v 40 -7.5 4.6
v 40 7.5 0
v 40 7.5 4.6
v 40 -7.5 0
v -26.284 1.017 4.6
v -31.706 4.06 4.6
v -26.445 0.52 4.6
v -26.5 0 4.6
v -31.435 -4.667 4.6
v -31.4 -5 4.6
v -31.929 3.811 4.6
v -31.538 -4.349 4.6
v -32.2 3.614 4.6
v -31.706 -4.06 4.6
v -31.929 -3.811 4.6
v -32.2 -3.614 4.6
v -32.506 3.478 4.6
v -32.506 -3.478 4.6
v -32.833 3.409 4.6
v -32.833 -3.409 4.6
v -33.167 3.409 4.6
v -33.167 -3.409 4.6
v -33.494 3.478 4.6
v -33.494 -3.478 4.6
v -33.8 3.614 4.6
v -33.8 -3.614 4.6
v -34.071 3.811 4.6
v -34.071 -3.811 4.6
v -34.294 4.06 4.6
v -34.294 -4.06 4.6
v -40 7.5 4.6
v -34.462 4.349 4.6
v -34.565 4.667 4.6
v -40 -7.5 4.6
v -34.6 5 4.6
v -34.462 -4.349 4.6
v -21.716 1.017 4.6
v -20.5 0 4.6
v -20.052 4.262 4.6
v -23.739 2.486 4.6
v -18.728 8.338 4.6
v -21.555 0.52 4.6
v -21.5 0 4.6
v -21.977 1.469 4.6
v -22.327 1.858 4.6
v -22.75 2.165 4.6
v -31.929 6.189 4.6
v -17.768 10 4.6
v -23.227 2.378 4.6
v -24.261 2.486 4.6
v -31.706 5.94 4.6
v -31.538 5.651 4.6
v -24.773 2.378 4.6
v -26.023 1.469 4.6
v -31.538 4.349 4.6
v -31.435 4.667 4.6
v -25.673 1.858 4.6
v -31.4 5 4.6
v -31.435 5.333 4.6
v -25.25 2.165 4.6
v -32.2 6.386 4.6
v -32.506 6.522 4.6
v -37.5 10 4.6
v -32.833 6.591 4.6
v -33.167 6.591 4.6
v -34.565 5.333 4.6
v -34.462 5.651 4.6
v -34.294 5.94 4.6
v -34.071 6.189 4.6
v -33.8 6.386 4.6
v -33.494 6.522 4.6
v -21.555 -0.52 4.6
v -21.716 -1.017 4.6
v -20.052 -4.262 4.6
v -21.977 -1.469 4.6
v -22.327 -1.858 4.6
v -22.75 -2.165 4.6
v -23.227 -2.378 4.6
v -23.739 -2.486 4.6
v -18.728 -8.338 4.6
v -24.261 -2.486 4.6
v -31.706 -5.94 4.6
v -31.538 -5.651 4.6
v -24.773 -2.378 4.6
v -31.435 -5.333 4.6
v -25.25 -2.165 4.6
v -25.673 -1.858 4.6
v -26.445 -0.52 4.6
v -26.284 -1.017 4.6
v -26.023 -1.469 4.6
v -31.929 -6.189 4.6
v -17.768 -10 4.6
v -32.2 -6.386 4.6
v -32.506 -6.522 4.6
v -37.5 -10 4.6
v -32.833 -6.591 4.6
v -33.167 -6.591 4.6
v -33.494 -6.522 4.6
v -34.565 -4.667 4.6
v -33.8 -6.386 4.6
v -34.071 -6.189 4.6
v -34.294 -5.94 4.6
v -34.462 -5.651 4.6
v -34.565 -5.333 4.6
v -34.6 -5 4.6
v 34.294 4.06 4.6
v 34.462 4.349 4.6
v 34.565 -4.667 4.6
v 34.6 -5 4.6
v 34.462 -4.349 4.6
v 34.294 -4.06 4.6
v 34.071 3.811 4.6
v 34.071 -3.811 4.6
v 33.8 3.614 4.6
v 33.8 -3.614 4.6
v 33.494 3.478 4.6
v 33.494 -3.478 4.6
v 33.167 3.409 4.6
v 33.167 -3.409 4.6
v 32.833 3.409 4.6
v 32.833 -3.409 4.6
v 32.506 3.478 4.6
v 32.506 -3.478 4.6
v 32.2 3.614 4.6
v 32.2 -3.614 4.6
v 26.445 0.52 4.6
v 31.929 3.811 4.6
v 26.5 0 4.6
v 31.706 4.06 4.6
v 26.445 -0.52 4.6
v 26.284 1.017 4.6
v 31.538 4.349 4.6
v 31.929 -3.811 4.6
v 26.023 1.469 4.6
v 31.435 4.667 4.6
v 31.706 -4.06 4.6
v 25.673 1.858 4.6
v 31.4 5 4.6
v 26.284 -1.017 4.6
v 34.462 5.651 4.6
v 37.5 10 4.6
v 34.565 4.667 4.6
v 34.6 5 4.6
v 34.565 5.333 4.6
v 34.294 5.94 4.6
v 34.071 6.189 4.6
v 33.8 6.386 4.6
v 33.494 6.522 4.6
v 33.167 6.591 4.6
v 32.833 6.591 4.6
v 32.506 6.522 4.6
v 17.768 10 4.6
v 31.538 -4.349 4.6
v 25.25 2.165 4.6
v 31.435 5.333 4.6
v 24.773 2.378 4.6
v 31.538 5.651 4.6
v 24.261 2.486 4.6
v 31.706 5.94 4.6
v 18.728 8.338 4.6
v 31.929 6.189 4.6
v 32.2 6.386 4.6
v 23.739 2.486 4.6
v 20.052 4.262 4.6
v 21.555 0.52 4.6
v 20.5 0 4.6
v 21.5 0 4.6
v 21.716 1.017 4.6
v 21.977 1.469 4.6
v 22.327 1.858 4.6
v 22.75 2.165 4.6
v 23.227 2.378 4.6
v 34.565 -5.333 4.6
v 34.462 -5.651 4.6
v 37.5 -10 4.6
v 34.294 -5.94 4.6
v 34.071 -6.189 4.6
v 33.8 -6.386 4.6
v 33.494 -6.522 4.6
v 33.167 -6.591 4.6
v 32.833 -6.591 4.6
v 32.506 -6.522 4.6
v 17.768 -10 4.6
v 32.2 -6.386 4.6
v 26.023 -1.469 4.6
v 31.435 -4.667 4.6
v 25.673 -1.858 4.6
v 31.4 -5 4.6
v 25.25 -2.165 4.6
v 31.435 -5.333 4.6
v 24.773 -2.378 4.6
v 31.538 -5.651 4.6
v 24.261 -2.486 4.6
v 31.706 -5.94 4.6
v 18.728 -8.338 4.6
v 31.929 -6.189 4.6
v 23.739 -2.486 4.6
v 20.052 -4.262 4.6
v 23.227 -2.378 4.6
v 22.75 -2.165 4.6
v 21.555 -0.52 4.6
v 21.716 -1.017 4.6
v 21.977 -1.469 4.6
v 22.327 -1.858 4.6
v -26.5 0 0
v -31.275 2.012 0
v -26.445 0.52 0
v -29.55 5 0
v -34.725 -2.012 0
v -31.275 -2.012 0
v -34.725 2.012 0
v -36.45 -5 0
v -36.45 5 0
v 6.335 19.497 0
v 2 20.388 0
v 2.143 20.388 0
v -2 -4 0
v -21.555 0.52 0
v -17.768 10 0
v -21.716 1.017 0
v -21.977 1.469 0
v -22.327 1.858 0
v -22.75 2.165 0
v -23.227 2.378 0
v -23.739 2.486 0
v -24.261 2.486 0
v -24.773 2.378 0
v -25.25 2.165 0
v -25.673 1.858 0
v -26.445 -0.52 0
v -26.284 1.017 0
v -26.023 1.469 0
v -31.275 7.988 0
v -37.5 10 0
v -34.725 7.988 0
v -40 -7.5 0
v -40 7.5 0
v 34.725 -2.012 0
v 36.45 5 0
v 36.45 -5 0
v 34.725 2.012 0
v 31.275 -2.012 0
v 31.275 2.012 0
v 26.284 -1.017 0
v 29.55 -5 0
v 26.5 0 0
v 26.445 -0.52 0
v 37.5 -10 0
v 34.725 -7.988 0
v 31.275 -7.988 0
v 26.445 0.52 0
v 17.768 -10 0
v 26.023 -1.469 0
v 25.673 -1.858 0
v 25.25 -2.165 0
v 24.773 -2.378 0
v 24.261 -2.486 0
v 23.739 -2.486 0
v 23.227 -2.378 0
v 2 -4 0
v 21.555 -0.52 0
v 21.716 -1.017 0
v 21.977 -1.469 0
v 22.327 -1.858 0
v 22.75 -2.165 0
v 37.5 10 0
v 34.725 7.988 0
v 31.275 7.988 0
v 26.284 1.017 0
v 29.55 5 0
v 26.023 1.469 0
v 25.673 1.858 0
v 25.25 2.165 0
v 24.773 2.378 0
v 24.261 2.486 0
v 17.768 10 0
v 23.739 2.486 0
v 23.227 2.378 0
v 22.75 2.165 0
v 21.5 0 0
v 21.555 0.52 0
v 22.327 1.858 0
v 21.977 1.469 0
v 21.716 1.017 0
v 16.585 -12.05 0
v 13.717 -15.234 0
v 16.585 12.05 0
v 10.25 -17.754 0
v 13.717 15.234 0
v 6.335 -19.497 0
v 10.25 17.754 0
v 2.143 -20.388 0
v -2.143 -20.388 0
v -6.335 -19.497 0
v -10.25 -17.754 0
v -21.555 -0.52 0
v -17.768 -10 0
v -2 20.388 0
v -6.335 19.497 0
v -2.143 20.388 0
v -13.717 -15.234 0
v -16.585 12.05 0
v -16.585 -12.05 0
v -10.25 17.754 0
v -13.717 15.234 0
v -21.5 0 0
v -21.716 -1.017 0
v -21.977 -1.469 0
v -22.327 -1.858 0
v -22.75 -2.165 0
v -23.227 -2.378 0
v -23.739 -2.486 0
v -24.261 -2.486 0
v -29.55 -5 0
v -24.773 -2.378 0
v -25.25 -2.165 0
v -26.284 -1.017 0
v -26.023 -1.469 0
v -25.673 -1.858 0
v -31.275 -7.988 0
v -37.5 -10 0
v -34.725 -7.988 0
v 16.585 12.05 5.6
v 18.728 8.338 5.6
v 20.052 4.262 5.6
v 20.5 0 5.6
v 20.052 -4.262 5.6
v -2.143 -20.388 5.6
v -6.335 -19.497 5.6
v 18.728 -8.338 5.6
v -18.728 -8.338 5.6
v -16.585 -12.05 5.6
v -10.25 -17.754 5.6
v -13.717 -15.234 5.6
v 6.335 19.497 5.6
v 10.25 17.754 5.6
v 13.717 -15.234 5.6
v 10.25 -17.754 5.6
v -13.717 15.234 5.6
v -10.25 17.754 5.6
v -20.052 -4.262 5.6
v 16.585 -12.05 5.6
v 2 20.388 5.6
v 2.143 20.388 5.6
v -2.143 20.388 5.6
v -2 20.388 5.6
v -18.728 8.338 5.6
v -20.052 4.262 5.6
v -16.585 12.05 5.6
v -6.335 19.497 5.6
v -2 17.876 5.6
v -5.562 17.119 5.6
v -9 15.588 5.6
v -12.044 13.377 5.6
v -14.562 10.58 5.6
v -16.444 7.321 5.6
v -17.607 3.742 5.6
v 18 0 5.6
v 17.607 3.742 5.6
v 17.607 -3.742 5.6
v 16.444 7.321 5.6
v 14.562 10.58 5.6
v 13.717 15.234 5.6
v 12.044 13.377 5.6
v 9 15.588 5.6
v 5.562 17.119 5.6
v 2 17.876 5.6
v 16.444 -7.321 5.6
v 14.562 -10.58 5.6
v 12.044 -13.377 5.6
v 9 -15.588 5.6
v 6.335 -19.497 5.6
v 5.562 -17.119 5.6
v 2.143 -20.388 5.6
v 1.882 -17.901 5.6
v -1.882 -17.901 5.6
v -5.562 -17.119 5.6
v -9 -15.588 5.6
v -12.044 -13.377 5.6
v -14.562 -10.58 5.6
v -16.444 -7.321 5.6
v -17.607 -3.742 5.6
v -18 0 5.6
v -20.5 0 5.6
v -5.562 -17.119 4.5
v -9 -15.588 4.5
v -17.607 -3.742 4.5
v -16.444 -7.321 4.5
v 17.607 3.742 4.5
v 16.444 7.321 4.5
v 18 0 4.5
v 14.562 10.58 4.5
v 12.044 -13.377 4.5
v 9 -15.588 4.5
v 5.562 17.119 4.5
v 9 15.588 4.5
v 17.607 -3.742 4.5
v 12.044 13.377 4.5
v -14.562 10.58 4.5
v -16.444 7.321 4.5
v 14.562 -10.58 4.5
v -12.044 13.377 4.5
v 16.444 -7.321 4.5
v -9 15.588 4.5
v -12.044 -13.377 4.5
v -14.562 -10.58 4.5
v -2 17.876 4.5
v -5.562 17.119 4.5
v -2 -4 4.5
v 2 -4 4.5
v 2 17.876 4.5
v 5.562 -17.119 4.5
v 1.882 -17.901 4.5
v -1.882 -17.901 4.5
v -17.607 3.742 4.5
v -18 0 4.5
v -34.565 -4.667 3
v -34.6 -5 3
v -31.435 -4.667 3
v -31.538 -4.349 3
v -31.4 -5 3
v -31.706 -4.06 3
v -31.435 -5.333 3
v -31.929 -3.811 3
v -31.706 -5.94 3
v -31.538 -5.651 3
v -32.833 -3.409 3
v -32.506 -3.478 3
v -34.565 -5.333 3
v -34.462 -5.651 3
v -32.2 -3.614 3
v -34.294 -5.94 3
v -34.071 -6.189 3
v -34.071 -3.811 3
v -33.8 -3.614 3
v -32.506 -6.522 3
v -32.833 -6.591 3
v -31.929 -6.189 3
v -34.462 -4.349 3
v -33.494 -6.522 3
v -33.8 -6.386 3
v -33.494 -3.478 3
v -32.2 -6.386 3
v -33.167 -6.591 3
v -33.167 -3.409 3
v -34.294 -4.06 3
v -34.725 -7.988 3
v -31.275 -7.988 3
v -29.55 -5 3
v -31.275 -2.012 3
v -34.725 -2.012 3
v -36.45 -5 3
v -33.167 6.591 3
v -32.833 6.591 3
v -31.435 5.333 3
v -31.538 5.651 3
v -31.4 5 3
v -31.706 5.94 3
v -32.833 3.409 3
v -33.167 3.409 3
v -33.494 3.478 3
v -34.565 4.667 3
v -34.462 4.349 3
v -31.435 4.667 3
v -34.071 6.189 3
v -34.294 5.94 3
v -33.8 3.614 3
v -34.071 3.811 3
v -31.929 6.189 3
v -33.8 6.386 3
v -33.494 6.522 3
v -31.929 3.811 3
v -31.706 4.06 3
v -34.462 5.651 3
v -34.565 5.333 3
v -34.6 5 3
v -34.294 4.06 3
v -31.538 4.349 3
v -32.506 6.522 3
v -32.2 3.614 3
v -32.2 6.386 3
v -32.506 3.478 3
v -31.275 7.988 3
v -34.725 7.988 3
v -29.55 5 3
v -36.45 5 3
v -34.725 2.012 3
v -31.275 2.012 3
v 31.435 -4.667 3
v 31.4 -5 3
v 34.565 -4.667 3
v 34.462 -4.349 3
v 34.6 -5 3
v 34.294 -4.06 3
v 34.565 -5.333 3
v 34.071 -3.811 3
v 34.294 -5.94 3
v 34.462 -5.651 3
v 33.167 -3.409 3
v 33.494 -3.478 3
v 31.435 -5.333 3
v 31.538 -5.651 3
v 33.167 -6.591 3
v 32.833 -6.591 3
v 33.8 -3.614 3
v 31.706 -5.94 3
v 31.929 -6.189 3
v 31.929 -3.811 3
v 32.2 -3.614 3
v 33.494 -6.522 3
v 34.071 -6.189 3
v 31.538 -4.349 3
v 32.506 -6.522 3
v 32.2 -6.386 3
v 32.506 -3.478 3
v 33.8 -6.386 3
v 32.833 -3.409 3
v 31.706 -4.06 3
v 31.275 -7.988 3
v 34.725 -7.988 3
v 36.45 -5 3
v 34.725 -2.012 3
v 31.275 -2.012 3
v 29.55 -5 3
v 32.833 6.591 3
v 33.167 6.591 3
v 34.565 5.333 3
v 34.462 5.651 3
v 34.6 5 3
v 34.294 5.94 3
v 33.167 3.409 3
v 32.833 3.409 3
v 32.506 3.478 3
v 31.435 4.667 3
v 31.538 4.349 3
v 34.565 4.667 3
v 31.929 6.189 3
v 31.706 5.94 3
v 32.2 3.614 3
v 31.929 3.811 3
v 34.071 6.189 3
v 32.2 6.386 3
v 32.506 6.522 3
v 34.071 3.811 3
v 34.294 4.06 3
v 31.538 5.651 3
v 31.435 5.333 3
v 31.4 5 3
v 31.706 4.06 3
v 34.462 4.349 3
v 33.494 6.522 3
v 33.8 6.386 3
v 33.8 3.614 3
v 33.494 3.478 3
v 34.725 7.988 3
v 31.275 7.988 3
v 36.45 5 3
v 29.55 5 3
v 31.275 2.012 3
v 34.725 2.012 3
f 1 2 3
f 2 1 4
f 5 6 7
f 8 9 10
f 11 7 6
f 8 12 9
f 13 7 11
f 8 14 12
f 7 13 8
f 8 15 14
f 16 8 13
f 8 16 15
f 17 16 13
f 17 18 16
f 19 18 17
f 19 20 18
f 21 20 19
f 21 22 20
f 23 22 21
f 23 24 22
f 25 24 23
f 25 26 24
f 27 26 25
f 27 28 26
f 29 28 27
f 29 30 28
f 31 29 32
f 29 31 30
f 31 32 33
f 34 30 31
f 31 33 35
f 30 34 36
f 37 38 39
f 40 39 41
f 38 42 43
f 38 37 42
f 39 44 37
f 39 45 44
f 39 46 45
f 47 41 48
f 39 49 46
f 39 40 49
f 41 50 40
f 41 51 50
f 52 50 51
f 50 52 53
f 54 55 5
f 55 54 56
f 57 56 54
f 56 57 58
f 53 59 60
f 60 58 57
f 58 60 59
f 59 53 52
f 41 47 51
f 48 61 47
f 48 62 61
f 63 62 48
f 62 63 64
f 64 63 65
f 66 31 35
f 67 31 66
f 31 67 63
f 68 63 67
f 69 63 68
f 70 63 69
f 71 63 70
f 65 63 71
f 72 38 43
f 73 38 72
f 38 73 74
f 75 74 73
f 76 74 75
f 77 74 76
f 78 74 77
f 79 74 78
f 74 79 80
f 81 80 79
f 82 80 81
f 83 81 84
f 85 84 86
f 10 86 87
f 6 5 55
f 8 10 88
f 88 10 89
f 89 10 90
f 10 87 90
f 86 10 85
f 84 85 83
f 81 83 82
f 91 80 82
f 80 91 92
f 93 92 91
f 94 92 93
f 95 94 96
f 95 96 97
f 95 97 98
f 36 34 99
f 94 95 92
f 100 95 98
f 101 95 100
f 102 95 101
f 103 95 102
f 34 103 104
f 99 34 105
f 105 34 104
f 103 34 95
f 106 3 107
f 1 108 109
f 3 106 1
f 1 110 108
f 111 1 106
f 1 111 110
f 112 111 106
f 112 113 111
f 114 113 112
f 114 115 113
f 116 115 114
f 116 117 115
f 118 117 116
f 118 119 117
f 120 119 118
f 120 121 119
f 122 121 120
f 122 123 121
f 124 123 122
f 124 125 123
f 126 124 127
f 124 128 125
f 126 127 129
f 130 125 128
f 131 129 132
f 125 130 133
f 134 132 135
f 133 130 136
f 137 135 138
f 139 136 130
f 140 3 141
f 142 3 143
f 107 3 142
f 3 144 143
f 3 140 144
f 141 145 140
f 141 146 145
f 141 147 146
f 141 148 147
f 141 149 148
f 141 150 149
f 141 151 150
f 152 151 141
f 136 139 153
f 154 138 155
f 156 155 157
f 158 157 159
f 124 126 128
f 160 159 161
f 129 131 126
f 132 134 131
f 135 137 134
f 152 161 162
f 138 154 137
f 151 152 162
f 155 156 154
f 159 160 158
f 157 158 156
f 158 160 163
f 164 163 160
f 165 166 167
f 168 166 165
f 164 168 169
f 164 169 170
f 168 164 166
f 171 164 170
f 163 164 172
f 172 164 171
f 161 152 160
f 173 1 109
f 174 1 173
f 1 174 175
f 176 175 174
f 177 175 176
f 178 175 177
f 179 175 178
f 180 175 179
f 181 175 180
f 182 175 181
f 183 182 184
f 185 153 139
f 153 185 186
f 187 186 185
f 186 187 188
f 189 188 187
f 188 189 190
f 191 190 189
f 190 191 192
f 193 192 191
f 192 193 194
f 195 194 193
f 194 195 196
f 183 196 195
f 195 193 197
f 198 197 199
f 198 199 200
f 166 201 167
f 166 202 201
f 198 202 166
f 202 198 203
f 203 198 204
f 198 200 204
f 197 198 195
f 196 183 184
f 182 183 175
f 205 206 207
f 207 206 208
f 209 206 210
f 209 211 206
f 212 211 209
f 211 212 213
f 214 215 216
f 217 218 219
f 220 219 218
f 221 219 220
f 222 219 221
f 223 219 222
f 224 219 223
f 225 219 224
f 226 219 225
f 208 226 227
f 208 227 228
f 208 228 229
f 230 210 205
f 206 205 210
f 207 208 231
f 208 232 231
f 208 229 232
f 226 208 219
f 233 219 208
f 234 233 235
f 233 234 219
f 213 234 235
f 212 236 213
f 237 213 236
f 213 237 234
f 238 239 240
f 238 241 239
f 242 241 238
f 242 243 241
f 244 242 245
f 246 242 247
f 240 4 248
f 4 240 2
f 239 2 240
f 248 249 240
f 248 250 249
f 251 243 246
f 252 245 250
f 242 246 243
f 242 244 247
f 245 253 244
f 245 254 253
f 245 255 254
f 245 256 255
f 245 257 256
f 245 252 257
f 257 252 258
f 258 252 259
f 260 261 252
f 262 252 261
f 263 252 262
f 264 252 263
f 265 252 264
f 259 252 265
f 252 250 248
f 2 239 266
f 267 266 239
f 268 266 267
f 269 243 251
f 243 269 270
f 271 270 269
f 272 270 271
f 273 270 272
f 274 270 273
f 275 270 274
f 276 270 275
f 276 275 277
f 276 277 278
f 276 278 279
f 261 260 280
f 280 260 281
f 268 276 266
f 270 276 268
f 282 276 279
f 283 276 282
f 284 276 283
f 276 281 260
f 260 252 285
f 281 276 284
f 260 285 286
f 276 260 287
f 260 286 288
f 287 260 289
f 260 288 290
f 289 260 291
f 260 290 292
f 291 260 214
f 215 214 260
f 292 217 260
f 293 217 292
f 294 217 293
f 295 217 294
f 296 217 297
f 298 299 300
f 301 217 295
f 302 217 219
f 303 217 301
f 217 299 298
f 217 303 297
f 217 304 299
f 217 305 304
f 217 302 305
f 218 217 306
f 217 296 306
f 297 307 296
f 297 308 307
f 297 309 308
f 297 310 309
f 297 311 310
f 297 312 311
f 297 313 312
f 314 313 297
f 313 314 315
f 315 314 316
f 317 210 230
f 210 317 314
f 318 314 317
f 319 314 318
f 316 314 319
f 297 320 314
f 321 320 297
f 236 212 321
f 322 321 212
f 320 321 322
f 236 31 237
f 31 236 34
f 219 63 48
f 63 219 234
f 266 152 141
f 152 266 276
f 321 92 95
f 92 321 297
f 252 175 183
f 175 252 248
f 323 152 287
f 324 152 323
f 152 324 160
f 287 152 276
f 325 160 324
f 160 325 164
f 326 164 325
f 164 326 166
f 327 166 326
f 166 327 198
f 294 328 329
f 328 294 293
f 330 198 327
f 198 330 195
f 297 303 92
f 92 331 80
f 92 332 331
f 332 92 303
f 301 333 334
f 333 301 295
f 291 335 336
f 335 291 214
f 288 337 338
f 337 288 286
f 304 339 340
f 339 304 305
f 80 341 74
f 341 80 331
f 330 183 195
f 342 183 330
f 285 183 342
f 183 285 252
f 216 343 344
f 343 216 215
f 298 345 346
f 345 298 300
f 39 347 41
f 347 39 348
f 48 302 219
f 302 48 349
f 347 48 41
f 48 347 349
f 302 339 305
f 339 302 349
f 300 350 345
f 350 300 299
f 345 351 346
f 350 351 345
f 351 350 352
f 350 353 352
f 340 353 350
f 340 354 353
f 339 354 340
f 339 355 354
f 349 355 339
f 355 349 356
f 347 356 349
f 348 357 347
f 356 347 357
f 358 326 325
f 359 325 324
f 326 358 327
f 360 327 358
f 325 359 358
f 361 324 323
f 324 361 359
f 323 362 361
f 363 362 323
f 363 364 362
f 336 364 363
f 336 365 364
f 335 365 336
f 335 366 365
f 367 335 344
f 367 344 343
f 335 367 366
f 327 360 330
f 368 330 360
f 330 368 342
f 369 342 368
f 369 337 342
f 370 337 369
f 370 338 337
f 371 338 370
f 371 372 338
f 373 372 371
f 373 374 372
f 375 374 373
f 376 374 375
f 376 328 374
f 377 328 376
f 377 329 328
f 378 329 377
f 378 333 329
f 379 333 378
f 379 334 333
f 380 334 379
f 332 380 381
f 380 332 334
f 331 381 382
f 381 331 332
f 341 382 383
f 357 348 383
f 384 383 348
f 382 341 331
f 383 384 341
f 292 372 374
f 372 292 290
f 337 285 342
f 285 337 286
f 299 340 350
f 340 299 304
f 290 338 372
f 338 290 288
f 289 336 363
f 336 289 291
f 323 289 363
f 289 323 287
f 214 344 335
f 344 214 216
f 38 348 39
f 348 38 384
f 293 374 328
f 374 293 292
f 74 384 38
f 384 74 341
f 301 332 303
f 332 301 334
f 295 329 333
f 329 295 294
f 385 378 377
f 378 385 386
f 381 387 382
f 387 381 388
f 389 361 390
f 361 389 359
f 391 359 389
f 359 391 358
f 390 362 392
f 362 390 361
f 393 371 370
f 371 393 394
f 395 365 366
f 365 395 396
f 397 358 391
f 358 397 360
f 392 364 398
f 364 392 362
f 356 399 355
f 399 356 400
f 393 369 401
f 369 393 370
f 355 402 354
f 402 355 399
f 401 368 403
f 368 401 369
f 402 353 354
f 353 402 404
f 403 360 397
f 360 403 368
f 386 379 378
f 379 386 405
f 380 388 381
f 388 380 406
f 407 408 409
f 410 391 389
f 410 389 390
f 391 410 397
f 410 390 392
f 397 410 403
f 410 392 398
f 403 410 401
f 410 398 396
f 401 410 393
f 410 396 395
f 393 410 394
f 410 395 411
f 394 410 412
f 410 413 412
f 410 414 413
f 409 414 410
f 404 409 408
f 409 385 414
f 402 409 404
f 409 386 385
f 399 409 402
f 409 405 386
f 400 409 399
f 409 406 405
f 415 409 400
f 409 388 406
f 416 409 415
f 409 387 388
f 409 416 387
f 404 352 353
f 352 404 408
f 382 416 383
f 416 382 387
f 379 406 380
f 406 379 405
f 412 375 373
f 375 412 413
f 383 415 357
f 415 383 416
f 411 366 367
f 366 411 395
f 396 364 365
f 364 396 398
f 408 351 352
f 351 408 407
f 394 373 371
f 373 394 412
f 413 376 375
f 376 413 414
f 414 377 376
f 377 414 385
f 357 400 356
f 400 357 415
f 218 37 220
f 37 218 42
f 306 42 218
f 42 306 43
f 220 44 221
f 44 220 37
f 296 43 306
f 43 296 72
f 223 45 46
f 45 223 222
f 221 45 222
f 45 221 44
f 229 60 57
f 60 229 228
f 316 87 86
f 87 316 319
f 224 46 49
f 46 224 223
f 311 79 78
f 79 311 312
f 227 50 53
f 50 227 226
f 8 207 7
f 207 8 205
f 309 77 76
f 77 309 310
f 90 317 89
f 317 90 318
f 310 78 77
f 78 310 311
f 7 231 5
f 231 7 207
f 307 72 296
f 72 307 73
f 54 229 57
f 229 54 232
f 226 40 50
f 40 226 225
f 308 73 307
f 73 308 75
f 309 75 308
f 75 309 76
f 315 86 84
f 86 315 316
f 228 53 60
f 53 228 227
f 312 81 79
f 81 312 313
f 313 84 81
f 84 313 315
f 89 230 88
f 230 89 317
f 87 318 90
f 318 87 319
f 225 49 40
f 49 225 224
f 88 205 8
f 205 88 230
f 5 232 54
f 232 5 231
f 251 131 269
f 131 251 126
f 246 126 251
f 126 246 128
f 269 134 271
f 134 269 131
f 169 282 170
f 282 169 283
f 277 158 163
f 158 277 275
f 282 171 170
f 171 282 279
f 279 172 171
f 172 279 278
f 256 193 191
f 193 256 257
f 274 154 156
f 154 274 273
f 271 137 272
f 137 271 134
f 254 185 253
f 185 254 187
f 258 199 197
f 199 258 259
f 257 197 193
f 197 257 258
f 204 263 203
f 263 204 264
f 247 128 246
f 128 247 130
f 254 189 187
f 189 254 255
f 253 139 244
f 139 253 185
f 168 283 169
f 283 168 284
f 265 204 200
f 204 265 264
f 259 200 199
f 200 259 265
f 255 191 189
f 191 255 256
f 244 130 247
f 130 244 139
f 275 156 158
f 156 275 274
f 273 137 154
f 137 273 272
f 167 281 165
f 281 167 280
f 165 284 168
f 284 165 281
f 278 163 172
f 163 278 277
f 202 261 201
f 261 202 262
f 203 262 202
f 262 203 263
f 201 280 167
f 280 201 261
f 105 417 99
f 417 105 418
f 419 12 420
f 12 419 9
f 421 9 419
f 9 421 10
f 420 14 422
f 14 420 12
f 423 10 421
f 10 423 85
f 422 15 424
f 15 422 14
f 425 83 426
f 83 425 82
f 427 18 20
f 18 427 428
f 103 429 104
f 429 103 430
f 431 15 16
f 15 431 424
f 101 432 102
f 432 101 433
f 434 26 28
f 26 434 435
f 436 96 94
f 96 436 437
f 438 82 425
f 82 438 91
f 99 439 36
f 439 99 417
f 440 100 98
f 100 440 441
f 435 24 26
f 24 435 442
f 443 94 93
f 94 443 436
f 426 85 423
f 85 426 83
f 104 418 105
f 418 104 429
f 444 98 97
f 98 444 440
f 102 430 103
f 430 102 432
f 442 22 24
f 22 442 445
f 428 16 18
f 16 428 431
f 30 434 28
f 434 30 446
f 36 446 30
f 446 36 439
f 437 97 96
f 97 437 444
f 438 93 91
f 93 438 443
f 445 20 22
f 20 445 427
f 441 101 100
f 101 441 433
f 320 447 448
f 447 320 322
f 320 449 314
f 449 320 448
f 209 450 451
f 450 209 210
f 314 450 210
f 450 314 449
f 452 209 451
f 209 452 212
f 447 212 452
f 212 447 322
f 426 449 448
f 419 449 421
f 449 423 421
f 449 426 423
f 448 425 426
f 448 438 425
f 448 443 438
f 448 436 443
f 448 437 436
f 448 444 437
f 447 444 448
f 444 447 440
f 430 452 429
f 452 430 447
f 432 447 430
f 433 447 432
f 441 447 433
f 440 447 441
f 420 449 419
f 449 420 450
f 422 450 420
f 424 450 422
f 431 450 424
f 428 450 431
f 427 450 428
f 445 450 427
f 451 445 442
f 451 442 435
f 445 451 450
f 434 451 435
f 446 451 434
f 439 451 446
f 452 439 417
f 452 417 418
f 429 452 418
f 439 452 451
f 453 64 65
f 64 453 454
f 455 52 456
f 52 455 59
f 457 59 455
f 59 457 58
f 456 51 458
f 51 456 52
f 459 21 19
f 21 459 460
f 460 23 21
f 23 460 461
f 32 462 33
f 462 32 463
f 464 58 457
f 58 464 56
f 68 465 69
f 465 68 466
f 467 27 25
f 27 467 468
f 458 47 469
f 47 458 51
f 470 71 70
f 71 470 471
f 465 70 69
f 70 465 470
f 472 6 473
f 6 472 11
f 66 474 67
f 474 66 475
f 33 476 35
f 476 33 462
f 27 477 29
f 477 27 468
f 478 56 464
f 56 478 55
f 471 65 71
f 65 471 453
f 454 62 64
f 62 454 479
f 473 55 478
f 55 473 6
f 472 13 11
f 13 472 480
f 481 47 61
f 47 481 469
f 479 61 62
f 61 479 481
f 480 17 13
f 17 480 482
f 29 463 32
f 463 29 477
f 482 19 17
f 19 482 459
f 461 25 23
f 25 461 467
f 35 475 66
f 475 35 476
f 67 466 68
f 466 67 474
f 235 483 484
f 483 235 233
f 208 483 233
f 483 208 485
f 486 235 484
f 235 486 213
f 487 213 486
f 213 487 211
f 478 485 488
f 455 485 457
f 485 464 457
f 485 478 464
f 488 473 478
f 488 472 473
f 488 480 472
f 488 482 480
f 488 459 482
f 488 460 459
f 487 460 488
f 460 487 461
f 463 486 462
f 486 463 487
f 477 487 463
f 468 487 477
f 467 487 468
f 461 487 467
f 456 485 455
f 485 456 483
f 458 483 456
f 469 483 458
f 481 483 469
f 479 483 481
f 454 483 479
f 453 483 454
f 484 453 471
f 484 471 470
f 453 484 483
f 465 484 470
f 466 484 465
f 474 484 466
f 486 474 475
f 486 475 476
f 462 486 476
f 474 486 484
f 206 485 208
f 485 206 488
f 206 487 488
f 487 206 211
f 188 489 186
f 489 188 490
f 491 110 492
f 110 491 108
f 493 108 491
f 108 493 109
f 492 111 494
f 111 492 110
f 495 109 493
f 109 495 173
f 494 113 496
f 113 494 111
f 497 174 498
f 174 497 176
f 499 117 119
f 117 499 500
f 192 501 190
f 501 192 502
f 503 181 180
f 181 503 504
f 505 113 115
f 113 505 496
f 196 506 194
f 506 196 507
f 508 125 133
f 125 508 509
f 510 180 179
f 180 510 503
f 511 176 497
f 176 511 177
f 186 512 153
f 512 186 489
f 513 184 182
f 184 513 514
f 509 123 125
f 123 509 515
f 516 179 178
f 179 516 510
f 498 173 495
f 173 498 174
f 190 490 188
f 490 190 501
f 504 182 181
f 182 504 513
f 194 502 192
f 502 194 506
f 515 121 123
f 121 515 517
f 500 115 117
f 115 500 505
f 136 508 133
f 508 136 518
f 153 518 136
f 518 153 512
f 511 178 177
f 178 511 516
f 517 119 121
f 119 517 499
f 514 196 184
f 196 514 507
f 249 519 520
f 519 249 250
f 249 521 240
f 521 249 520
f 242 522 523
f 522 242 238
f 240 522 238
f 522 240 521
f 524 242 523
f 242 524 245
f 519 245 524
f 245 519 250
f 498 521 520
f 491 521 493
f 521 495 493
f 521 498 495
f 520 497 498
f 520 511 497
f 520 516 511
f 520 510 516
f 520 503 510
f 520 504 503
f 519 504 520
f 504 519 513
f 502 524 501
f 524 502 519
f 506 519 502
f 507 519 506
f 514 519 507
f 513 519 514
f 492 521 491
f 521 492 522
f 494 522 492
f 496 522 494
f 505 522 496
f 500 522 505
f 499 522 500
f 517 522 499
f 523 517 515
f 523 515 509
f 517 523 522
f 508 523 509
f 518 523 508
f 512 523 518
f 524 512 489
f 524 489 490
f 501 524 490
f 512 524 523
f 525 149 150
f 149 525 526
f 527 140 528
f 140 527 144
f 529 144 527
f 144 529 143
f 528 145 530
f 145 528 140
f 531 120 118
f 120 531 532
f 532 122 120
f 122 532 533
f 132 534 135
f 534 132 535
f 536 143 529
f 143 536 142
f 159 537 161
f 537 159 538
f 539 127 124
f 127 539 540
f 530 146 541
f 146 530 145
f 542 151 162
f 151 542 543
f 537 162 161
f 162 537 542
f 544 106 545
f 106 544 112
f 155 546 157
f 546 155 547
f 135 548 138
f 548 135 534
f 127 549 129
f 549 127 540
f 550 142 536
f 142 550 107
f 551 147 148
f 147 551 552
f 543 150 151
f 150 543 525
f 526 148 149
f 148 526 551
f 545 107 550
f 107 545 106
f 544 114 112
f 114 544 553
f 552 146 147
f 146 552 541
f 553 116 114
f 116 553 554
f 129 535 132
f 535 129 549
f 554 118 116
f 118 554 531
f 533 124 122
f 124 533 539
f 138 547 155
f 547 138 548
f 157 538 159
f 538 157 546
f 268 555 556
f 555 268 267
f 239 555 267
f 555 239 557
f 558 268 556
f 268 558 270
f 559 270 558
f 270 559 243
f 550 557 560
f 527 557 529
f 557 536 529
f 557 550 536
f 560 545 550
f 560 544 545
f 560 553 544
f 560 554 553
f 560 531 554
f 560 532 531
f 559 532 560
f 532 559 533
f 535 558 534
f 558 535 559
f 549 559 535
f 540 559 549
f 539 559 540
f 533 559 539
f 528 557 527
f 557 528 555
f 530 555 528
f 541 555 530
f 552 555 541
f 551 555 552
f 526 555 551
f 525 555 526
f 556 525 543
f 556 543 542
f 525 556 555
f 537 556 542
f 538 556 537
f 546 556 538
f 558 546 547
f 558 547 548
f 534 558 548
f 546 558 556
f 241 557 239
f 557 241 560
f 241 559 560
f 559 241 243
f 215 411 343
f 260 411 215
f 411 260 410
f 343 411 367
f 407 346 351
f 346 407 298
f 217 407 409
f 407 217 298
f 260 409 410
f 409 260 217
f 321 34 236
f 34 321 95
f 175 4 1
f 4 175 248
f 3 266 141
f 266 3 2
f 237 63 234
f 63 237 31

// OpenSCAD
// RebeliX
//
// piezo holder
// GNU GPL v3
// jacho
// http://www.mlab.cz

fan_width = 40;
fan_diameter = 38;
fan_mount = 33;

spring_diameter=6.5;
spring_height=5;

hotend_diameter=16.2;
hotend_height=4.8;
hotend_height_tolerance=1;

piezo_diameter=36;
piezo_height=2.2;
piezo_height_tolerance=1.4;

cylinder_diameter=piezo_diameter+5;
cylinder_height= 1+hotend_height+piezo_height-hotend_height_tolerance-piezo_height_tolerance;
cylinder_hole= 1.1;

cube_length=80;
cube_width=20;

holder_pitch=48;
holder_diameter=5;

mount_height = 1+hotend_height+piezo_height-hotend_height_tolerance-piezo_height_tolerance-1;

M3_vyska_matky=3;
M3_sirka_matky=6.7;



difference(){
	union(){
	  translate([0,0,mount_height/2])
        cube([cube_length,cube_width,mount_height],true);
	   
      translate([0,0,cylinder_height/2])  
        cylinder(h=cylinder_height, r=cylinder_diameter/2, center=true);
	}	

	
	
	//otvor pro piezo	
	translate([0,0,cylinder_height-cylinder_hole]) cylinder(r=piezo_diameter/2,h=piezo_height,$fn=30);
	
	// Otvory pro prisroubovani
	translate([-holder_pitch/2,0,-0.1]) cylinder(r=holder_diameter/2,h=mount_height+1,$fn=30);
	
		
	translate([holder_pitch/2,0,-0.1]) cylinder(r=holder_diameter/2,h=mount_height+1,$fn=30);
	
	
	//otvory na šrouby
    translate([-cube_length/2+7,-5,-0.1]) cylinder(r=3.2/2,h=mount_height+1,$fn=30);
	
    translate([-cube_length/2+7,-5,-0.01])
    cylinder (h = M3_vyska_matky + 0.01, r = (M3_sirka_matky + 0.2)/2, $fn = 6);
	
	
    
    translate([-cube_length/2+7,5,-0.1]) cylinder(r=3.2/2,h=mount_height+1,$fn=30);
	
    translate([-cube_length/2+7,5,-0.01])
    cylinder (h = M3_vyska_matky + 0.01, r = (M3_sirka_matky + 0.2)/2, $fn = 6);
	
    
    
        translate([cube_length/2-7,-5,-0.1]) cylinder(r=3.2/2,h=mount_height+1,$fn=30);
	
    translate([cube_length/2-7,-5,-0.01])
    cylinder (h = M3_vyska_matky + 0.01, r = (M3_sirka_matky + 0.2)/2, $fn = 6);
	
	
    
    translate([cube_length/2-7,5,-0.1]) cylinder(r=3.2/2,h=mount_height+1,$fn=30);
	
    translate([cube_length/2-7,5,-0.01])
    cylinder (h = M3_vyska_matky + 0.01, r = (M3_sirka_matky + 0.2)/2, $fn = 6);
	
    
    //otvor pro kabel
    translate([0,-2+cylinder_diameter/2/2,cylinder_height/2])
        cube([4,cylinder_diameter/2+4,cylinder_height+2],true);
	   
      
    
    
    
	// Seriznute rohy
	translate([-cube_length/2+2.5,-cube_width/2,-0.1]) rotate([0,0,135]) cube([5,5,10]);
	translate([cube_length/2-2.5,-cube_width/2,-0.1]) rotate([0,0,-45]) cube([5,5,10]);
	translate([cube_length/2,cube_width/2-2.5,-0.1]) rotate([0,0,45]) cube([5,5,10]);
	translate([-cube_length/2+2.5,cube_width/2,-0.1]) rotate([0,0,135]) cube([5,5,10]);
}	
